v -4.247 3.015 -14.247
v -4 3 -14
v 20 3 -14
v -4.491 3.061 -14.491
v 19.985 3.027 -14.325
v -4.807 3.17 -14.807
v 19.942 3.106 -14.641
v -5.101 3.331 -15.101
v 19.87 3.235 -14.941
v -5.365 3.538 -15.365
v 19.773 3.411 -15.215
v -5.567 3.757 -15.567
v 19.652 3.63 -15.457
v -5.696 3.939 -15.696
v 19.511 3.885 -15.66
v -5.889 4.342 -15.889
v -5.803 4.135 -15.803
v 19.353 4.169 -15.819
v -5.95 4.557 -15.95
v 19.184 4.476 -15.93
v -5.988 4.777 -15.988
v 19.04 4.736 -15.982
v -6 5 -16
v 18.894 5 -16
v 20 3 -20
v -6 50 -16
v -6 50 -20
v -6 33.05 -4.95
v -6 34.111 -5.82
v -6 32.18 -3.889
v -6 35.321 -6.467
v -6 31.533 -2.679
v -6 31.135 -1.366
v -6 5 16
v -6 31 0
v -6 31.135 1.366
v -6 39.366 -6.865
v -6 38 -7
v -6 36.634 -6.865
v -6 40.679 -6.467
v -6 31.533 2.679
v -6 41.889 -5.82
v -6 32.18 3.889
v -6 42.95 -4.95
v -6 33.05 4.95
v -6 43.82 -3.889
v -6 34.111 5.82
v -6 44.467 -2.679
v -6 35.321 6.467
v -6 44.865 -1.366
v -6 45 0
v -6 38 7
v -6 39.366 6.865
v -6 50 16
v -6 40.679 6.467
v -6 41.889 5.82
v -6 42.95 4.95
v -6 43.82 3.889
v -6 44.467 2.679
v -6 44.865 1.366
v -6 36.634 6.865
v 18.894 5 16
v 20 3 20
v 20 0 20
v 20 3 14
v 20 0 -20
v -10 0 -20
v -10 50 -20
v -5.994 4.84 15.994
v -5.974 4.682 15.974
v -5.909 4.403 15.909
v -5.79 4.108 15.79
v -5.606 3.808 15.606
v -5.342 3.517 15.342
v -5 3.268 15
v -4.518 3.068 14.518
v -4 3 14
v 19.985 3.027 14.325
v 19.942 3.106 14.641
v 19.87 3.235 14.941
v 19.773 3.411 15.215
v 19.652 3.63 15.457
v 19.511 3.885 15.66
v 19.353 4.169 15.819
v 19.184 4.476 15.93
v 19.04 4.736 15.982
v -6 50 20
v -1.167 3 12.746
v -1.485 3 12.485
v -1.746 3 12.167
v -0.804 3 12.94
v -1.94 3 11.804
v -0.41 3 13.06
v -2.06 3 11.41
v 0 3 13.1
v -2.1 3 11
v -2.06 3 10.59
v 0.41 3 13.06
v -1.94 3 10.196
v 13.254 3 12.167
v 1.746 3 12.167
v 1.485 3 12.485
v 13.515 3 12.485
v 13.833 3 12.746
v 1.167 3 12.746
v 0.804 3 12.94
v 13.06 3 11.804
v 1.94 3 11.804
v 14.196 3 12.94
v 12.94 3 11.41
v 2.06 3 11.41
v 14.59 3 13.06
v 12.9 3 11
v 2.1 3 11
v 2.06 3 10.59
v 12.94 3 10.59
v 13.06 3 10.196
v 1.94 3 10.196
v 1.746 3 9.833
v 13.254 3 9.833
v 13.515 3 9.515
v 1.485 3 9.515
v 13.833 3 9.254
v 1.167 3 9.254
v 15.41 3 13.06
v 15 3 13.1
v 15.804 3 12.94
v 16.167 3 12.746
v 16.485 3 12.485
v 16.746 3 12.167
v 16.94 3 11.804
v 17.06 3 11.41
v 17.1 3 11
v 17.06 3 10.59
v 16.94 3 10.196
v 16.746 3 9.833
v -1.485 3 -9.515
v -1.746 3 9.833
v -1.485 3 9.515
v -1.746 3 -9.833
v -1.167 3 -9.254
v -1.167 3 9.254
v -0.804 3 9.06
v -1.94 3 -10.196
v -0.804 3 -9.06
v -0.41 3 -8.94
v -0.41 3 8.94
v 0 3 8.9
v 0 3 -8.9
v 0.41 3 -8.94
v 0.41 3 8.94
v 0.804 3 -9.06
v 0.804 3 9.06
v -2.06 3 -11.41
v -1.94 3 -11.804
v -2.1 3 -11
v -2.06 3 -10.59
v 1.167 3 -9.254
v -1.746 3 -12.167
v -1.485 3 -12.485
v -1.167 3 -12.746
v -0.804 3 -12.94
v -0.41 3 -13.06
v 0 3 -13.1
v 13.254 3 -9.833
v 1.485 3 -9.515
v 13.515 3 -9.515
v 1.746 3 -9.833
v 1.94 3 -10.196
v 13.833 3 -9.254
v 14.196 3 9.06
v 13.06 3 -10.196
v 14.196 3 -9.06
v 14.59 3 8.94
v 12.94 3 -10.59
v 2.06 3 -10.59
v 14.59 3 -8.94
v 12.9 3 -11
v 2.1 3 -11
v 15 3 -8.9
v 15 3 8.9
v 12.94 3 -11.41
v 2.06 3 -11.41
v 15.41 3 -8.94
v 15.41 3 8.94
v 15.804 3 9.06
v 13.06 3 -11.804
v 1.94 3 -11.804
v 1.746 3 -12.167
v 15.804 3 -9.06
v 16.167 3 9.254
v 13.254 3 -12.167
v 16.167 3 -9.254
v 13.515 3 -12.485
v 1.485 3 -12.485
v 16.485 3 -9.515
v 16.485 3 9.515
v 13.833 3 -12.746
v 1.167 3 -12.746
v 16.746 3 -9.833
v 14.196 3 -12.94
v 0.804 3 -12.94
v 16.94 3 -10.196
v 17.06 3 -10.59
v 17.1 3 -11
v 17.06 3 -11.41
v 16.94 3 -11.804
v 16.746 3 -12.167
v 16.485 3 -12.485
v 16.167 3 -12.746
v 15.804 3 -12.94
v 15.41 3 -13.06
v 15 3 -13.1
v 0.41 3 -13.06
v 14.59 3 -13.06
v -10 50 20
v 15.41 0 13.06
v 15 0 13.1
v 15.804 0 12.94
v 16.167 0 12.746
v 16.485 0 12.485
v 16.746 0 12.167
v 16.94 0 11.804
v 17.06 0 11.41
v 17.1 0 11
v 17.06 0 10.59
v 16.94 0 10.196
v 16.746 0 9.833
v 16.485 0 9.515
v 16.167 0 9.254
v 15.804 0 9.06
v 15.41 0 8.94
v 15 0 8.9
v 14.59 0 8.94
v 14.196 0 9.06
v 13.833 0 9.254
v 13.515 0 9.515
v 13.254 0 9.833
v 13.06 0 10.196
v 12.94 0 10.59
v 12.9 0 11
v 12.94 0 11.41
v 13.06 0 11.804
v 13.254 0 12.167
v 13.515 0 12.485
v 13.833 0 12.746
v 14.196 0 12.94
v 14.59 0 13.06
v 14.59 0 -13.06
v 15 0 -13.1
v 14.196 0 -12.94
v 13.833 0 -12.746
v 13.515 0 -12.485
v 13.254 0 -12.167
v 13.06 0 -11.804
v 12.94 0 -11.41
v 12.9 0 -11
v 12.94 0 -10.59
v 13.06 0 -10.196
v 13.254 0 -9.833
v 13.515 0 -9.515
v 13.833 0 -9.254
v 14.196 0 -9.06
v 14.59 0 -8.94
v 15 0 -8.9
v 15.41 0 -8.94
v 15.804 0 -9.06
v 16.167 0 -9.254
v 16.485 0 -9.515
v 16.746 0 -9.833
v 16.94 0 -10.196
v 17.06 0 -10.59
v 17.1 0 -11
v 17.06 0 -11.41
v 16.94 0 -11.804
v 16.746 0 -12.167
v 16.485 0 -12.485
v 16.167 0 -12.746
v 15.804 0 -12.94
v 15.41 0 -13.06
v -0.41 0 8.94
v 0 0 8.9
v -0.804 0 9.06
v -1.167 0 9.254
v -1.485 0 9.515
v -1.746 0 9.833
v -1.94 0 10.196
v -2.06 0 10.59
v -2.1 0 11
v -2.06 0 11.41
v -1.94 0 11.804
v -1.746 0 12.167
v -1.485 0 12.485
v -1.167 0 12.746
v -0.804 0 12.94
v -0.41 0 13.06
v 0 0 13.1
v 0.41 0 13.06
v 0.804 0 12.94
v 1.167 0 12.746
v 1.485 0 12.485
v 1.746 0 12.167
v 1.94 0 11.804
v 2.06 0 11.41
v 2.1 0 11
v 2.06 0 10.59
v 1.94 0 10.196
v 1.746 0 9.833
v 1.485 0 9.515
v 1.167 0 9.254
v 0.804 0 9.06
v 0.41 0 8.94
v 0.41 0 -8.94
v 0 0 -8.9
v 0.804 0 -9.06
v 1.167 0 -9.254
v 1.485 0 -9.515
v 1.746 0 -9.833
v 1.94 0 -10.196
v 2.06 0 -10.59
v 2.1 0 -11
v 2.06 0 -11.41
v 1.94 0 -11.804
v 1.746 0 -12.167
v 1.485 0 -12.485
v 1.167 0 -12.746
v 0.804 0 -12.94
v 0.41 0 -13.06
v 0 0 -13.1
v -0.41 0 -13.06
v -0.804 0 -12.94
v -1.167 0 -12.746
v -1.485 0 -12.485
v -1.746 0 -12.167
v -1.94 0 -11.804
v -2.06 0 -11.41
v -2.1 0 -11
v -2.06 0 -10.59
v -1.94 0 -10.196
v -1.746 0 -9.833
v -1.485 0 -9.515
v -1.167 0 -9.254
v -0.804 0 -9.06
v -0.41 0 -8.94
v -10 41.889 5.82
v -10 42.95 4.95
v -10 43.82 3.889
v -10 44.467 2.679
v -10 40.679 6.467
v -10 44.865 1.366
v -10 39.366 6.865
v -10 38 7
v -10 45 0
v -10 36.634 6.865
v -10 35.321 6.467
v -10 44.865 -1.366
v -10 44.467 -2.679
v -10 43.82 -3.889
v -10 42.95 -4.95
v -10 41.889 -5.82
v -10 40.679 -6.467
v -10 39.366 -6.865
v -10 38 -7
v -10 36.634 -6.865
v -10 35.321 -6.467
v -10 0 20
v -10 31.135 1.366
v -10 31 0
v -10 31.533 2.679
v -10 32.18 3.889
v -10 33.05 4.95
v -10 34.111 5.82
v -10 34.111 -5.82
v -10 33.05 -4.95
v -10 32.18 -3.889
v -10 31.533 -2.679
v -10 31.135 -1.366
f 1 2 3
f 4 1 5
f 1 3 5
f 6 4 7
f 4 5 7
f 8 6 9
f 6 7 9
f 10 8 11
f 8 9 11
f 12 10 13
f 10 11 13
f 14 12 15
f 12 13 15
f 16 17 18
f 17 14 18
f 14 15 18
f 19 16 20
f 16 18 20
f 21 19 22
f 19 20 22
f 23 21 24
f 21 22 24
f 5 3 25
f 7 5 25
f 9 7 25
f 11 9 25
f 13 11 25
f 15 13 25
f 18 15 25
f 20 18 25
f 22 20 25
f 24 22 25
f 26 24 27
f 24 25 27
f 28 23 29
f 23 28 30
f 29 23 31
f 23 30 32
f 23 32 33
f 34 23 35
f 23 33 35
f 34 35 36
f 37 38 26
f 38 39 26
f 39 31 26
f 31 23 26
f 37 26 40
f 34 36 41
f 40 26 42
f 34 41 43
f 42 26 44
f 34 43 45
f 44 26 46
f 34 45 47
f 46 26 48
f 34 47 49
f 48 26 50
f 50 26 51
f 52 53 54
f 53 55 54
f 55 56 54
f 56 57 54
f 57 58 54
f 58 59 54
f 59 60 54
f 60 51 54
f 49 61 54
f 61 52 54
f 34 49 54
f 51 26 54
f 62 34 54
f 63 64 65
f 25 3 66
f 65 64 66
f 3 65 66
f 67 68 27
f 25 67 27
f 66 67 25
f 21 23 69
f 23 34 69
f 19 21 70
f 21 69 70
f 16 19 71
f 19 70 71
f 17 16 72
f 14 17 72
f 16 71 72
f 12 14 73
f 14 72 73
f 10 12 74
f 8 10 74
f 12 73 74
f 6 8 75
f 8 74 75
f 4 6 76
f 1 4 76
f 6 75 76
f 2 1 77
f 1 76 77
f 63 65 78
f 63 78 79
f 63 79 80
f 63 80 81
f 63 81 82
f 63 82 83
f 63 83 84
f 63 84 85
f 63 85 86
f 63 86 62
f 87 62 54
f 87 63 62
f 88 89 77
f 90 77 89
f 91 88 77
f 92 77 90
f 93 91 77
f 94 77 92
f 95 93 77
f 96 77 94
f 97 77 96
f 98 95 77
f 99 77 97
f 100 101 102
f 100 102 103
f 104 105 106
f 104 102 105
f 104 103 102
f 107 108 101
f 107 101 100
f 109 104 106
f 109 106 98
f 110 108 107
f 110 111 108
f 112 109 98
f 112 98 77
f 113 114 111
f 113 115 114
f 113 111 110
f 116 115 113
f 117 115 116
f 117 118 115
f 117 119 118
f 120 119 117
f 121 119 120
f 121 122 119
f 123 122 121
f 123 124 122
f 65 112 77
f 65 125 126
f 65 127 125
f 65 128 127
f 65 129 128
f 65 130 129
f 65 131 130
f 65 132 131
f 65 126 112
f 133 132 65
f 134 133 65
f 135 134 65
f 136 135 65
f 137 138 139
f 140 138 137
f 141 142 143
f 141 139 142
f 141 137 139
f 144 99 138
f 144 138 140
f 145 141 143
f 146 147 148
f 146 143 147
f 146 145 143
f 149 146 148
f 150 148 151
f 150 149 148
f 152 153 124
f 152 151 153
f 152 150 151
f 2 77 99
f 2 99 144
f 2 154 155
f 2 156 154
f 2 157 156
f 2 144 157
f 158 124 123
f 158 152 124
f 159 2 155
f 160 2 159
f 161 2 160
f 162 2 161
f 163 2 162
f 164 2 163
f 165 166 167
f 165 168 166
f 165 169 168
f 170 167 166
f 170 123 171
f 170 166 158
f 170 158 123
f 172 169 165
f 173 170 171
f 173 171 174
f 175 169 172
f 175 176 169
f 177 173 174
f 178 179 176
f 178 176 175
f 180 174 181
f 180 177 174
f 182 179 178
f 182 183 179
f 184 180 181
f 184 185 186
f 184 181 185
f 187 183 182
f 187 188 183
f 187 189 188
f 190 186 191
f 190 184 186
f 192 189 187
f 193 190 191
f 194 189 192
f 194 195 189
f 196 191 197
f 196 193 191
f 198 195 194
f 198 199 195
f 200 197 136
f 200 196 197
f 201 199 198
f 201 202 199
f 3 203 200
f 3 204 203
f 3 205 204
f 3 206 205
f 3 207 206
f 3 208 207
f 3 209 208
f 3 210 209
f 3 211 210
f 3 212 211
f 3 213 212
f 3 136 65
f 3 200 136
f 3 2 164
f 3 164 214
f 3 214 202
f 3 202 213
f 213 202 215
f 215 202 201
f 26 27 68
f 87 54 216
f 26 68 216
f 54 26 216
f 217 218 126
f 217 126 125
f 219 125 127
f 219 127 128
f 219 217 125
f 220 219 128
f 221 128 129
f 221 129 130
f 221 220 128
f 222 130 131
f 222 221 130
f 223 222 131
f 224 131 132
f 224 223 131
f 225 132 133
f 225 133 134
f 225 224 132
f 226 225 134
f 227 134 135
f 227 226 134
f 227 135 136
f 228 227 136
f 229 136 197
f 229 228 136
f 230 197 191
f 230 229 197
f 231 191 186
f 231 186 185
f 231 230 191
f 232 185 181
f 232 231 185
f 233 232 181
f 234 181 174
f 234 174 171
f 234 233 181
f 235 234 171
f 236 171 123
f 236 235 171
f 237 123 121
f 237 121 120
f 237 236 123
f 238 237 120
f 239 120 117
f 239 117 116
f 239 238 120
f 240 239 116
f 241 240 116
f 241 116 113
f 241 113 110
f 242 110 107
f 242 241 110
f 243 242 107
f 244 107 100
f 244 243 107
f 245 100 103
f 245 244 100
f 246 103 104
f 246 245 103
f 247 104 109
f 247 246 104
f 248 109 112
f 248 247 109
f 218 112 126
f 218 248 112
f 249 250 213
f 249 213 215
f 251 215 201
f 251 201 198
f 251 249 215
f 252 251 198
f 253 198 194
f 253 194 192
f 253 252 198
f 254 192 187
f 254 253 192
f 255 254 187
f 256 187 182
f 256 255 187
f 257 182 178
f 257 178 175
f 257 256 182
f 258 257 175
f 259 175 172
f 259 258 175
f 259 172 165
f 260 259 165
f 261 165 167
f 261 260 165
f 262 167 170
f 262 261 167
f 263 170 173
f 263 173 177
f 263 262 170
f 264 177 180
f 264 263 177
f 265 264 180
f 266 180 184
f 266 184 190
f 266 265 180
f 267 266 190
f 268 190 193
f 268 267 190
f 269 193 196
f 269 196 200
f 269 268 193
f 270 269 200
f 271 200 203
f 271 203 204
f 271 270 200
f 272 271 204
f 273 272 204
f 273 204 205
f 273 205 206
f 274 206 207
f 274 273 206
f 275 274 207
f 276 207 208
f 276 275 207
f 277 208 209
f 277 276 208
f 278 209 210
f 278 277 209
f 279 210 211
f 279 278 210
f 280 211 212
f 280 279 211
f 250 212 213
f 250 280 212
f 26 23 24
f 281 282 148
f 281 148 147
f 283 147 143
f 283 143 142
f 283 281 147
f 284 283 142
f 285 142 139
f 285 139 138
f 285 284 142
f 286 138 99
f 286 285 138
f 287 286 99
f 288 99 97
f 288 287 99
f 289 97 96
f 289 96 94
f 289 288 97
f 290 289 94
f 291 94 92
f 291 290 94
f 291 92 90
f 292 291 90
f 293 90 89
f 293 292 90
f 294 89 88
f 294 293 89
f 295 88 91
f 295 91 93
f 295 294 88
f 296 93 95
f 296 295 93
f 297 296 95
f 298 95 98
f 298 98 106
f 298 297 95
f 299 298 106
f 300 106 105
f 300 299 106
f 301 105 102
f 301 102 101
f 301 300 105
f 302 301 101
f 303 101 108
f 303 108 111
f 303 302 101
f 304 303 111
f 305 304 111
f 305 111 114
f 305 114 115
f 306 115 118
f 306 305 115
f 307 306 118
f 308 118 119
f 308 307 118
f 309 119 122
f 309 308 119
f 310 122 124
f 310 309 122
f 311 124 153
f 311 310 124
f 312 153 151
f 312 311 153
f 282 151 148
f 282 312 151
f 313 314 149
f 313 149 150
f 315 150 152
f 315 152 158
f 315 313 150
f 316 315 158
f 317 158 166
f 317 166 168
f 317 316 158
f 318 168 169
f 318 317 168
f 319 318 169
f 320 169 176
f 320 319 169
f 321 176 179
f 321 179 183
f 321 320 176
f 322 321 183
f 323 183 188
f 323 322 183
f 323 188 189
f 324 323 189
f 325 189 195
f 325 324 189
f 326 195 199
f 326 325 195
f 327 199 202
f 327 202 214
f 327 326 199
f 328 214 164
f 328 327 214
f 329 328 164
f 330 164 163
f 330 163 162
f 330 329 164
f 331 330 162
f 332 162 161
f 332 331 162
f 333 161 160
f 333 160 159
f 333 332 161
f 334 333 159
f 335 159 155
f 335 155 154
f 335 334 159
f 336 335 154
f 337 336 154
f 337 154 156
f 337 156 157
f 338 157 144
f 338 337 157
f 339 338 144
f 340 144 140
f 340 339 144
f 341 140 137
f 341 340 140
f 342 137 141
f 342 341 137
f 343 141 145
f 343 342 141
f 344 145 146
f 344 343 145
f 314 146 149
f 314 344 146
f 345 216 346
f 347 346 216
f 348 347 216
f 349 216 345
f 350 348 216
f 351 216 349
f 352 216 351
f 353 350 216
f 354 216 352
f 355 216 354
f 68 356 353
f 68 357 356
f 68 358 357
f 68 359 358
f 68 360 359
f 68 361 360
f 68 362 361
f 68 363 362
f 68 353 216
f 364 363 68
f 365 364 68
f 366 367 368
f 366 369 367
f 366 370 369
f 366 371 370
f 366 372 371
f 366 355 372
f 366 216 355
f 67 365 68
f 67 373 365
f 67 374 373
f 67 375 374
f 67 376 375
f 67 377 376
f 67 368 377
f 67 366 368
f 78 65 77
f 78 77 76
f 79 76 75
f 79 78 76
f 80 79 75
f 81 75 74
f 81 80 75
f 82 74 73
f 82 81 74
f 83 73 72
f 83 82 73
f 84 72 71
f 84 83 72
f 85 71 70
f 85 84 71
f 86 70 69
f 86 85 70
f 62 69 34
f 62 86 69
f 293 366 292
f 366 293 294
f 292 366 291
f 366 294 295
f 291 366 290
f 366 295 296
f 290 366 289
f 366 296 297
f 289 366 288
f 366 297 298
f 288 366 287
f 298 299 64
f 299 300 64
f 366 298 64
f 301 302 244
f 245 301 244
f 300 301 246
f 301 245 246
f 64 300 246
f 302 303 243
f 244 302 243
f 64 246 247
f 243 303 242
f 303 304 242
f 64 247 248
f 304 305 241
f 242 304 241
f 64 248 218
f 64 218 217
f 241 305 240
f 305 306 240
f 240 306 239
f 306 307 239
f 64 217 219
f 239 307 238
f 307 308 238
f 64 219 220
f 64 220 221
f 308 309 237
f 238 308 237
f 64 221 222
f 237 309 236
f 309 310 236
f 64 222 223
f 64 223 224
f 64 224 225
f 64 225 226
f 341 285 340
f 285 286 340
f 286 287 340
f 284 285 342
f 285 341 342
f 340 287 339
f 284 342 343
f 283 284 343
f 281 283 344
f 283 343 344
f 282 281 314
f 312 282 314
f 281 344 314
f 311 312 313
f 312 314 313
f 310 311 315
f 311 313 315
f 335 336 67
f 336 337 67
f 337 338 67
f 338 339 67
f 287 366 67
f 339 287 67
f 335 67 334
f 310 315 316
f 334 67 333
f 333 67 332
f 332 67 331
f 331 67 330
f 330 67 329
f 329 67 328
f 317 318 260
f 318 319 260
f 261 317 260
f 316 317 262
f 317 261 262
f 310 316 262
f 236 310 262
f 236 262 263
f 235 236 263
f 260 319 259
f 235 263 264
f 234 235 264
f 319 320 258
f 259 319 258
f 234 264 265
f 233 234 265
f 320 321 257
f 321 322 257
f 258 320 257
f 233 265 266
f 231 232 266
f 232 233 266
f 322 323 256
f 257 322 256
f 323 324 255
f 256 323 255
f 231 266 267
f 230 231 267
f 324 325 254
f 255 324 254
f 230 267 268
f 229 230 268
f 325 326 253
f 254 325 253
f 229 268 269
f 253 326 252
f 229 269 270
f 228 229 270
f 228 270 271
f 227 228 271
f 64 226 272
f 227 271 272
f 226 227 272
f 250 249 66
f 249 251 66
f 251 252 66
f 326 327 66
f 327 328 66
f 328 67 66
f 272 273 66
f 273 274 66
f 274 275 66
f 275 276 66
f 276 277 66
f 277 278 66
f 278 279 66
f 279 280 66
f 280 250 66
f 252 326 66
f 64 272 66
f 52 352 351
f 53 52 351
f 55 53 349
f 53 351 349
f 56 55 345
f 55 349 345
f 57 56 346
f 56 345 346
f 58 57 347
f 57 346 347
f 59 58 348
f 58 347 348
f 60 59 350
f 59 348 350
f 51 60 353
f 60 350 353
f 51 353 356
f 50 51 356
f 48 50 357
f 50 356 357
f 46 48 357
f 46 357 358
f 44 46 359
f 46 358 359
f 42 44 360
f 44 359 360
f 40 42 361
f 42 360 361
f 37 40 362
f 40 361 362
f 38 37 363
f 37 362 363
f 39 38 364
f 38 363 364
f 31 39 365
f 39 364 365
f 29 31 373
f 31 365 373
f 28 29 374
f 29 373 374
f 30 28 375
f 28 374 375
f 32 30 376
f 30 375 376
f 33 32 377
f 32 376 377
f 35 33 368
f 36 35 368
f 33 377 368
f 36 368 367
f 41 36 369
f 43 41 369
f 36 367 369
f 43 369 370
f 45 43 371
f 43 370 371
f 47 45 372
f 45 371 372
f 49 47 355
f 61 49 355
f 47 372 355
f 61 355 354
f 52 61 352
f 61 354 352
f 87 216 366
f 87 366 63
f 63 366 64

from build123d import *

# Parameters (mm, degrees)
SSS_W               = 30
SSS_H               = 40
SSS_R               = 2.1
BOSS_EXTRUDE2_DEPTH = 3
SKETCH1_W           = 40
SKETCH1_H           = 50
SKETCH1_R           = 7
BOSS_EXTRUDE3_DEPTH = 4
BOSS_EXTRUDE4_DEPTH = 4
FILLET1_R           = 2


with BuildPart() as part:
    # sss → Boss-Extrude2 (new body)
    with BuildSketch(Plane(origin=(0, 0, 0), x_dir=(1, 0, 0), z_dir=(0, 1, 0))):
        with Locations((5, 0)):
            Rectangle(SSS_W, SSS_H)
        with Locations(Location((0, 11, 0), (0, 0, 270))):
            Circle(SSS_R, mode=Mode.SUBTRACT)
        with Locations(Location((0, -11, 0), (0, 0, 90))):
            Circle(SSS_R, mode=Mode.SUBTRACT)
        with Locations(Location((15, -11, 0), (0, 0, 270))):
            Circle(SSS_R, mode=Mode.SUBTRACT)
        with Locations(Location((15, 11, 0), (0, 0, 90))):
            Circle(SSS_R, mode=Mode.SUBTRACT)
    extrude(amount=BOSS_EXTRUDE2_DEPTH)

    # Sketch1 → Boss-Extrude3 (add)
    with BuildSketch(Plane.ZY.offset(10)):
        with Locations((0, 25)):
            Rectangle(SKETCH1_W, SKETCH1_H)
        with Locations((0, 38)):
            Circle(SKETCH1_R, mode=Mode.SUBTRACT)
    extrude(amount=-BOSS_EXTRUDE3_DEPTH)

    # Sketch2 → Boss-Extrude4 (add)
    with BuildSketch(Plane.XY.offset(20)):
        Polygon((-10, 50), (-10, 0), (20, 0), (20, 3), (-6, 50), align=None)
    boss_extrude4 = extrude(amount=-BOSS_EXTRUDE4_DEPTH)

    # Mirror1: Boss-Extrude4 across plane
    add(boss_extrude4.mirror(Plane.XY))

    # Fillet1
    fillet1_edges = [part.edges().sort_by_distance(p)[0] for p in [
        (7, 3, 16),
        (-6, 3, 0),
        (7, 3, -16),
    ]]
    fillet(fillet1_edges, radius=FILLET1_R)


solid = part.part
